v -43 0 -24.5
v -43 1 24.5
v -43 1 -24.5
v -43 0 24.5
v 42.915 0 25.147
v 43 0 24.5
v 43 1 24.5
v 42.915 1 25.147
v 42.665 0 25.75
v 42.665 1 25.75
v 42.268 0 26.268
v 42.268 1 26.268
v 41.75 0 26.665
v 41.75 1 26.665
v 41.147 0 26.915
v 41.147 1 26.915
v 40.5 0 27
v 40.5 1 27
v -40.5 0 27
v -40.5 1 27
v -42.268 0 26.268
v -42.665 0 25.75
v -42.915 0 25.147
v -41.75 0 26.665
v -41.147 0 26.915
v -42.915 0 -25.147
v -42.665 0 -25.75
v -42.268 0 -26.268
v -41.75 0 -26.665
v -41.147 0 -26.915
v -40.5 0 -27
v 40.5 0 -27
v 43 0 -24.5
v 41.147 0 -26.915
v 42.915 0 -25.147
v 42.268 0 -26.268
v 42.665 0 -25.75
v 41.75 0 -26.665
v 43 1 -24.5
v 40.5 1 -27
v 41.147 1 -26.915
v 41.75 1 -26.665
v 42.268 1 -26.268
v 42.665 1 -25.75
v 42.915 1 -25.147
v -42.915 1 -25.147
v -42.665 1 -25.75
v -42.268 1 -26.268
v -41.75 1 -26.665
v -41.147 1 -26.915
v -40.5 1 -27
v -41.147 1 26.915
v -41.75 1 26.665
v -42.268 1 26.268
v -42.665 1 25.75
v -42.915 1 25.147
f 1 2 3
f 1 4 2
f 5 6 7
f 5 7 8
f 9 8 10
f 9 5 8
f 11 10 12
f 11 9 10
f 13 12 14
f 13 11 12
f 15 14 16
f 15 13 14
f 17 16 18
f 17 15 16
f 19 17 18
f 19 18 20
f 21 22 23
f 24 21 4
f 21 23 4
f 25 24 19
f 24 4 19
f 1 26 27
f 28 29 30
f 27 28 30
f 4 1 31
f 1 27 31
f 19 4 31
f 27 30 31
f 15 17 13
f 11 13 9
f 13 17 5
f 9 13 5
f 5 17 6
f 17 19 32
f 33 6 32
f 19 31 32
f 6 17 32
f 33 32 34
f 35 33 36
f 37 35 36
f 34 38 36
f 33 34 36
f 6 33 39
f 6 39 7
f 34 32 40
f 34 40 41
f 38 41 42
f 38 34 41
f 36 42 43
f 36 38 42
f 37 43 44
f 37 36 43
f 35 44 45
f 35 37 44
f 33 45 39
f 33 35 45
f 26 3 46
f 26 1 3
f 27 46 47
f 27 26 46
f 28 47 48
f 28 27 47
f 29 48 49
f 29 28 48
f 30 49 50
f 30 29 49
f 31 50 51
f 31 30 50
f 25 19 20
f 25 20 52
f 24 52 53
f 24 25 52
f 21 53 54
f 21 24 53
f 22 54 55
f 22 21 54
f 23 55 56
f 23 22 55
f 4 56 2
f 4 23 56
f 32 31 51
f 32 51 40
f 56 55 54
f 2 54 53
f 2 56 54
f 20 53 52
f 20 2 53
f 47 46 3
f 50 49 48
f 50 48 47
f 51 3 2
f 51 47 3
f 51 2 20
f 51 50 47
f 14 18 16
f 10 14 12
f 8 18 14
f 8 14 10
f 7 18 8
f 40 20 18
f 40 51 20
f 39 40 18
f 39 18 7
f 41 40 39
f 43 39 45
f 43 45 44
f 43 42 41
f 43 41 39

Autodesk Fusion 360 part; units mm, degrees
sketch "Sketch1" plane through (0, 0, 0) normal (0, 1, 0) x (1, 0, 0)
  line L0 (40.5, -27) -> (-40.5, -27)
  line L1 (-43, -24.5) -> (-43, 24.5)
  line L2 (-40.5, 27) -> (40.5, 27)
  line L3 (43, 24.5) -> (43, -24.5)
  line L4 (43, -27) -> (-43, 27) construction
  line L5 (-43, -27) -> (43, 27) construction
  arc A0 (-40.5, 27) -> (-43, 24.5) centre (-40.5, 24.5) ccw
  arc A1 (43, 24.5) -> (40.5, 27) centre (40.5, 24.5) ccw
  arc A2 (40.5, -27) -> (43, -24.5) centre (40.5, -24.5) ccw
  arc A3 (-43, -24.5) -> (-40.5, -27) centre (-40.5, -24.5) ccw
  dimension "d1" = 86
  dimension "d2" = 54
  dimension "d5" = 2.5
  dimension "d6" = 2.5
  dimension "d7" = 2.5
  dimension "d8" = 2.5
extrude "Extrude1" add sketch "Sketch1" along normal blind 1
